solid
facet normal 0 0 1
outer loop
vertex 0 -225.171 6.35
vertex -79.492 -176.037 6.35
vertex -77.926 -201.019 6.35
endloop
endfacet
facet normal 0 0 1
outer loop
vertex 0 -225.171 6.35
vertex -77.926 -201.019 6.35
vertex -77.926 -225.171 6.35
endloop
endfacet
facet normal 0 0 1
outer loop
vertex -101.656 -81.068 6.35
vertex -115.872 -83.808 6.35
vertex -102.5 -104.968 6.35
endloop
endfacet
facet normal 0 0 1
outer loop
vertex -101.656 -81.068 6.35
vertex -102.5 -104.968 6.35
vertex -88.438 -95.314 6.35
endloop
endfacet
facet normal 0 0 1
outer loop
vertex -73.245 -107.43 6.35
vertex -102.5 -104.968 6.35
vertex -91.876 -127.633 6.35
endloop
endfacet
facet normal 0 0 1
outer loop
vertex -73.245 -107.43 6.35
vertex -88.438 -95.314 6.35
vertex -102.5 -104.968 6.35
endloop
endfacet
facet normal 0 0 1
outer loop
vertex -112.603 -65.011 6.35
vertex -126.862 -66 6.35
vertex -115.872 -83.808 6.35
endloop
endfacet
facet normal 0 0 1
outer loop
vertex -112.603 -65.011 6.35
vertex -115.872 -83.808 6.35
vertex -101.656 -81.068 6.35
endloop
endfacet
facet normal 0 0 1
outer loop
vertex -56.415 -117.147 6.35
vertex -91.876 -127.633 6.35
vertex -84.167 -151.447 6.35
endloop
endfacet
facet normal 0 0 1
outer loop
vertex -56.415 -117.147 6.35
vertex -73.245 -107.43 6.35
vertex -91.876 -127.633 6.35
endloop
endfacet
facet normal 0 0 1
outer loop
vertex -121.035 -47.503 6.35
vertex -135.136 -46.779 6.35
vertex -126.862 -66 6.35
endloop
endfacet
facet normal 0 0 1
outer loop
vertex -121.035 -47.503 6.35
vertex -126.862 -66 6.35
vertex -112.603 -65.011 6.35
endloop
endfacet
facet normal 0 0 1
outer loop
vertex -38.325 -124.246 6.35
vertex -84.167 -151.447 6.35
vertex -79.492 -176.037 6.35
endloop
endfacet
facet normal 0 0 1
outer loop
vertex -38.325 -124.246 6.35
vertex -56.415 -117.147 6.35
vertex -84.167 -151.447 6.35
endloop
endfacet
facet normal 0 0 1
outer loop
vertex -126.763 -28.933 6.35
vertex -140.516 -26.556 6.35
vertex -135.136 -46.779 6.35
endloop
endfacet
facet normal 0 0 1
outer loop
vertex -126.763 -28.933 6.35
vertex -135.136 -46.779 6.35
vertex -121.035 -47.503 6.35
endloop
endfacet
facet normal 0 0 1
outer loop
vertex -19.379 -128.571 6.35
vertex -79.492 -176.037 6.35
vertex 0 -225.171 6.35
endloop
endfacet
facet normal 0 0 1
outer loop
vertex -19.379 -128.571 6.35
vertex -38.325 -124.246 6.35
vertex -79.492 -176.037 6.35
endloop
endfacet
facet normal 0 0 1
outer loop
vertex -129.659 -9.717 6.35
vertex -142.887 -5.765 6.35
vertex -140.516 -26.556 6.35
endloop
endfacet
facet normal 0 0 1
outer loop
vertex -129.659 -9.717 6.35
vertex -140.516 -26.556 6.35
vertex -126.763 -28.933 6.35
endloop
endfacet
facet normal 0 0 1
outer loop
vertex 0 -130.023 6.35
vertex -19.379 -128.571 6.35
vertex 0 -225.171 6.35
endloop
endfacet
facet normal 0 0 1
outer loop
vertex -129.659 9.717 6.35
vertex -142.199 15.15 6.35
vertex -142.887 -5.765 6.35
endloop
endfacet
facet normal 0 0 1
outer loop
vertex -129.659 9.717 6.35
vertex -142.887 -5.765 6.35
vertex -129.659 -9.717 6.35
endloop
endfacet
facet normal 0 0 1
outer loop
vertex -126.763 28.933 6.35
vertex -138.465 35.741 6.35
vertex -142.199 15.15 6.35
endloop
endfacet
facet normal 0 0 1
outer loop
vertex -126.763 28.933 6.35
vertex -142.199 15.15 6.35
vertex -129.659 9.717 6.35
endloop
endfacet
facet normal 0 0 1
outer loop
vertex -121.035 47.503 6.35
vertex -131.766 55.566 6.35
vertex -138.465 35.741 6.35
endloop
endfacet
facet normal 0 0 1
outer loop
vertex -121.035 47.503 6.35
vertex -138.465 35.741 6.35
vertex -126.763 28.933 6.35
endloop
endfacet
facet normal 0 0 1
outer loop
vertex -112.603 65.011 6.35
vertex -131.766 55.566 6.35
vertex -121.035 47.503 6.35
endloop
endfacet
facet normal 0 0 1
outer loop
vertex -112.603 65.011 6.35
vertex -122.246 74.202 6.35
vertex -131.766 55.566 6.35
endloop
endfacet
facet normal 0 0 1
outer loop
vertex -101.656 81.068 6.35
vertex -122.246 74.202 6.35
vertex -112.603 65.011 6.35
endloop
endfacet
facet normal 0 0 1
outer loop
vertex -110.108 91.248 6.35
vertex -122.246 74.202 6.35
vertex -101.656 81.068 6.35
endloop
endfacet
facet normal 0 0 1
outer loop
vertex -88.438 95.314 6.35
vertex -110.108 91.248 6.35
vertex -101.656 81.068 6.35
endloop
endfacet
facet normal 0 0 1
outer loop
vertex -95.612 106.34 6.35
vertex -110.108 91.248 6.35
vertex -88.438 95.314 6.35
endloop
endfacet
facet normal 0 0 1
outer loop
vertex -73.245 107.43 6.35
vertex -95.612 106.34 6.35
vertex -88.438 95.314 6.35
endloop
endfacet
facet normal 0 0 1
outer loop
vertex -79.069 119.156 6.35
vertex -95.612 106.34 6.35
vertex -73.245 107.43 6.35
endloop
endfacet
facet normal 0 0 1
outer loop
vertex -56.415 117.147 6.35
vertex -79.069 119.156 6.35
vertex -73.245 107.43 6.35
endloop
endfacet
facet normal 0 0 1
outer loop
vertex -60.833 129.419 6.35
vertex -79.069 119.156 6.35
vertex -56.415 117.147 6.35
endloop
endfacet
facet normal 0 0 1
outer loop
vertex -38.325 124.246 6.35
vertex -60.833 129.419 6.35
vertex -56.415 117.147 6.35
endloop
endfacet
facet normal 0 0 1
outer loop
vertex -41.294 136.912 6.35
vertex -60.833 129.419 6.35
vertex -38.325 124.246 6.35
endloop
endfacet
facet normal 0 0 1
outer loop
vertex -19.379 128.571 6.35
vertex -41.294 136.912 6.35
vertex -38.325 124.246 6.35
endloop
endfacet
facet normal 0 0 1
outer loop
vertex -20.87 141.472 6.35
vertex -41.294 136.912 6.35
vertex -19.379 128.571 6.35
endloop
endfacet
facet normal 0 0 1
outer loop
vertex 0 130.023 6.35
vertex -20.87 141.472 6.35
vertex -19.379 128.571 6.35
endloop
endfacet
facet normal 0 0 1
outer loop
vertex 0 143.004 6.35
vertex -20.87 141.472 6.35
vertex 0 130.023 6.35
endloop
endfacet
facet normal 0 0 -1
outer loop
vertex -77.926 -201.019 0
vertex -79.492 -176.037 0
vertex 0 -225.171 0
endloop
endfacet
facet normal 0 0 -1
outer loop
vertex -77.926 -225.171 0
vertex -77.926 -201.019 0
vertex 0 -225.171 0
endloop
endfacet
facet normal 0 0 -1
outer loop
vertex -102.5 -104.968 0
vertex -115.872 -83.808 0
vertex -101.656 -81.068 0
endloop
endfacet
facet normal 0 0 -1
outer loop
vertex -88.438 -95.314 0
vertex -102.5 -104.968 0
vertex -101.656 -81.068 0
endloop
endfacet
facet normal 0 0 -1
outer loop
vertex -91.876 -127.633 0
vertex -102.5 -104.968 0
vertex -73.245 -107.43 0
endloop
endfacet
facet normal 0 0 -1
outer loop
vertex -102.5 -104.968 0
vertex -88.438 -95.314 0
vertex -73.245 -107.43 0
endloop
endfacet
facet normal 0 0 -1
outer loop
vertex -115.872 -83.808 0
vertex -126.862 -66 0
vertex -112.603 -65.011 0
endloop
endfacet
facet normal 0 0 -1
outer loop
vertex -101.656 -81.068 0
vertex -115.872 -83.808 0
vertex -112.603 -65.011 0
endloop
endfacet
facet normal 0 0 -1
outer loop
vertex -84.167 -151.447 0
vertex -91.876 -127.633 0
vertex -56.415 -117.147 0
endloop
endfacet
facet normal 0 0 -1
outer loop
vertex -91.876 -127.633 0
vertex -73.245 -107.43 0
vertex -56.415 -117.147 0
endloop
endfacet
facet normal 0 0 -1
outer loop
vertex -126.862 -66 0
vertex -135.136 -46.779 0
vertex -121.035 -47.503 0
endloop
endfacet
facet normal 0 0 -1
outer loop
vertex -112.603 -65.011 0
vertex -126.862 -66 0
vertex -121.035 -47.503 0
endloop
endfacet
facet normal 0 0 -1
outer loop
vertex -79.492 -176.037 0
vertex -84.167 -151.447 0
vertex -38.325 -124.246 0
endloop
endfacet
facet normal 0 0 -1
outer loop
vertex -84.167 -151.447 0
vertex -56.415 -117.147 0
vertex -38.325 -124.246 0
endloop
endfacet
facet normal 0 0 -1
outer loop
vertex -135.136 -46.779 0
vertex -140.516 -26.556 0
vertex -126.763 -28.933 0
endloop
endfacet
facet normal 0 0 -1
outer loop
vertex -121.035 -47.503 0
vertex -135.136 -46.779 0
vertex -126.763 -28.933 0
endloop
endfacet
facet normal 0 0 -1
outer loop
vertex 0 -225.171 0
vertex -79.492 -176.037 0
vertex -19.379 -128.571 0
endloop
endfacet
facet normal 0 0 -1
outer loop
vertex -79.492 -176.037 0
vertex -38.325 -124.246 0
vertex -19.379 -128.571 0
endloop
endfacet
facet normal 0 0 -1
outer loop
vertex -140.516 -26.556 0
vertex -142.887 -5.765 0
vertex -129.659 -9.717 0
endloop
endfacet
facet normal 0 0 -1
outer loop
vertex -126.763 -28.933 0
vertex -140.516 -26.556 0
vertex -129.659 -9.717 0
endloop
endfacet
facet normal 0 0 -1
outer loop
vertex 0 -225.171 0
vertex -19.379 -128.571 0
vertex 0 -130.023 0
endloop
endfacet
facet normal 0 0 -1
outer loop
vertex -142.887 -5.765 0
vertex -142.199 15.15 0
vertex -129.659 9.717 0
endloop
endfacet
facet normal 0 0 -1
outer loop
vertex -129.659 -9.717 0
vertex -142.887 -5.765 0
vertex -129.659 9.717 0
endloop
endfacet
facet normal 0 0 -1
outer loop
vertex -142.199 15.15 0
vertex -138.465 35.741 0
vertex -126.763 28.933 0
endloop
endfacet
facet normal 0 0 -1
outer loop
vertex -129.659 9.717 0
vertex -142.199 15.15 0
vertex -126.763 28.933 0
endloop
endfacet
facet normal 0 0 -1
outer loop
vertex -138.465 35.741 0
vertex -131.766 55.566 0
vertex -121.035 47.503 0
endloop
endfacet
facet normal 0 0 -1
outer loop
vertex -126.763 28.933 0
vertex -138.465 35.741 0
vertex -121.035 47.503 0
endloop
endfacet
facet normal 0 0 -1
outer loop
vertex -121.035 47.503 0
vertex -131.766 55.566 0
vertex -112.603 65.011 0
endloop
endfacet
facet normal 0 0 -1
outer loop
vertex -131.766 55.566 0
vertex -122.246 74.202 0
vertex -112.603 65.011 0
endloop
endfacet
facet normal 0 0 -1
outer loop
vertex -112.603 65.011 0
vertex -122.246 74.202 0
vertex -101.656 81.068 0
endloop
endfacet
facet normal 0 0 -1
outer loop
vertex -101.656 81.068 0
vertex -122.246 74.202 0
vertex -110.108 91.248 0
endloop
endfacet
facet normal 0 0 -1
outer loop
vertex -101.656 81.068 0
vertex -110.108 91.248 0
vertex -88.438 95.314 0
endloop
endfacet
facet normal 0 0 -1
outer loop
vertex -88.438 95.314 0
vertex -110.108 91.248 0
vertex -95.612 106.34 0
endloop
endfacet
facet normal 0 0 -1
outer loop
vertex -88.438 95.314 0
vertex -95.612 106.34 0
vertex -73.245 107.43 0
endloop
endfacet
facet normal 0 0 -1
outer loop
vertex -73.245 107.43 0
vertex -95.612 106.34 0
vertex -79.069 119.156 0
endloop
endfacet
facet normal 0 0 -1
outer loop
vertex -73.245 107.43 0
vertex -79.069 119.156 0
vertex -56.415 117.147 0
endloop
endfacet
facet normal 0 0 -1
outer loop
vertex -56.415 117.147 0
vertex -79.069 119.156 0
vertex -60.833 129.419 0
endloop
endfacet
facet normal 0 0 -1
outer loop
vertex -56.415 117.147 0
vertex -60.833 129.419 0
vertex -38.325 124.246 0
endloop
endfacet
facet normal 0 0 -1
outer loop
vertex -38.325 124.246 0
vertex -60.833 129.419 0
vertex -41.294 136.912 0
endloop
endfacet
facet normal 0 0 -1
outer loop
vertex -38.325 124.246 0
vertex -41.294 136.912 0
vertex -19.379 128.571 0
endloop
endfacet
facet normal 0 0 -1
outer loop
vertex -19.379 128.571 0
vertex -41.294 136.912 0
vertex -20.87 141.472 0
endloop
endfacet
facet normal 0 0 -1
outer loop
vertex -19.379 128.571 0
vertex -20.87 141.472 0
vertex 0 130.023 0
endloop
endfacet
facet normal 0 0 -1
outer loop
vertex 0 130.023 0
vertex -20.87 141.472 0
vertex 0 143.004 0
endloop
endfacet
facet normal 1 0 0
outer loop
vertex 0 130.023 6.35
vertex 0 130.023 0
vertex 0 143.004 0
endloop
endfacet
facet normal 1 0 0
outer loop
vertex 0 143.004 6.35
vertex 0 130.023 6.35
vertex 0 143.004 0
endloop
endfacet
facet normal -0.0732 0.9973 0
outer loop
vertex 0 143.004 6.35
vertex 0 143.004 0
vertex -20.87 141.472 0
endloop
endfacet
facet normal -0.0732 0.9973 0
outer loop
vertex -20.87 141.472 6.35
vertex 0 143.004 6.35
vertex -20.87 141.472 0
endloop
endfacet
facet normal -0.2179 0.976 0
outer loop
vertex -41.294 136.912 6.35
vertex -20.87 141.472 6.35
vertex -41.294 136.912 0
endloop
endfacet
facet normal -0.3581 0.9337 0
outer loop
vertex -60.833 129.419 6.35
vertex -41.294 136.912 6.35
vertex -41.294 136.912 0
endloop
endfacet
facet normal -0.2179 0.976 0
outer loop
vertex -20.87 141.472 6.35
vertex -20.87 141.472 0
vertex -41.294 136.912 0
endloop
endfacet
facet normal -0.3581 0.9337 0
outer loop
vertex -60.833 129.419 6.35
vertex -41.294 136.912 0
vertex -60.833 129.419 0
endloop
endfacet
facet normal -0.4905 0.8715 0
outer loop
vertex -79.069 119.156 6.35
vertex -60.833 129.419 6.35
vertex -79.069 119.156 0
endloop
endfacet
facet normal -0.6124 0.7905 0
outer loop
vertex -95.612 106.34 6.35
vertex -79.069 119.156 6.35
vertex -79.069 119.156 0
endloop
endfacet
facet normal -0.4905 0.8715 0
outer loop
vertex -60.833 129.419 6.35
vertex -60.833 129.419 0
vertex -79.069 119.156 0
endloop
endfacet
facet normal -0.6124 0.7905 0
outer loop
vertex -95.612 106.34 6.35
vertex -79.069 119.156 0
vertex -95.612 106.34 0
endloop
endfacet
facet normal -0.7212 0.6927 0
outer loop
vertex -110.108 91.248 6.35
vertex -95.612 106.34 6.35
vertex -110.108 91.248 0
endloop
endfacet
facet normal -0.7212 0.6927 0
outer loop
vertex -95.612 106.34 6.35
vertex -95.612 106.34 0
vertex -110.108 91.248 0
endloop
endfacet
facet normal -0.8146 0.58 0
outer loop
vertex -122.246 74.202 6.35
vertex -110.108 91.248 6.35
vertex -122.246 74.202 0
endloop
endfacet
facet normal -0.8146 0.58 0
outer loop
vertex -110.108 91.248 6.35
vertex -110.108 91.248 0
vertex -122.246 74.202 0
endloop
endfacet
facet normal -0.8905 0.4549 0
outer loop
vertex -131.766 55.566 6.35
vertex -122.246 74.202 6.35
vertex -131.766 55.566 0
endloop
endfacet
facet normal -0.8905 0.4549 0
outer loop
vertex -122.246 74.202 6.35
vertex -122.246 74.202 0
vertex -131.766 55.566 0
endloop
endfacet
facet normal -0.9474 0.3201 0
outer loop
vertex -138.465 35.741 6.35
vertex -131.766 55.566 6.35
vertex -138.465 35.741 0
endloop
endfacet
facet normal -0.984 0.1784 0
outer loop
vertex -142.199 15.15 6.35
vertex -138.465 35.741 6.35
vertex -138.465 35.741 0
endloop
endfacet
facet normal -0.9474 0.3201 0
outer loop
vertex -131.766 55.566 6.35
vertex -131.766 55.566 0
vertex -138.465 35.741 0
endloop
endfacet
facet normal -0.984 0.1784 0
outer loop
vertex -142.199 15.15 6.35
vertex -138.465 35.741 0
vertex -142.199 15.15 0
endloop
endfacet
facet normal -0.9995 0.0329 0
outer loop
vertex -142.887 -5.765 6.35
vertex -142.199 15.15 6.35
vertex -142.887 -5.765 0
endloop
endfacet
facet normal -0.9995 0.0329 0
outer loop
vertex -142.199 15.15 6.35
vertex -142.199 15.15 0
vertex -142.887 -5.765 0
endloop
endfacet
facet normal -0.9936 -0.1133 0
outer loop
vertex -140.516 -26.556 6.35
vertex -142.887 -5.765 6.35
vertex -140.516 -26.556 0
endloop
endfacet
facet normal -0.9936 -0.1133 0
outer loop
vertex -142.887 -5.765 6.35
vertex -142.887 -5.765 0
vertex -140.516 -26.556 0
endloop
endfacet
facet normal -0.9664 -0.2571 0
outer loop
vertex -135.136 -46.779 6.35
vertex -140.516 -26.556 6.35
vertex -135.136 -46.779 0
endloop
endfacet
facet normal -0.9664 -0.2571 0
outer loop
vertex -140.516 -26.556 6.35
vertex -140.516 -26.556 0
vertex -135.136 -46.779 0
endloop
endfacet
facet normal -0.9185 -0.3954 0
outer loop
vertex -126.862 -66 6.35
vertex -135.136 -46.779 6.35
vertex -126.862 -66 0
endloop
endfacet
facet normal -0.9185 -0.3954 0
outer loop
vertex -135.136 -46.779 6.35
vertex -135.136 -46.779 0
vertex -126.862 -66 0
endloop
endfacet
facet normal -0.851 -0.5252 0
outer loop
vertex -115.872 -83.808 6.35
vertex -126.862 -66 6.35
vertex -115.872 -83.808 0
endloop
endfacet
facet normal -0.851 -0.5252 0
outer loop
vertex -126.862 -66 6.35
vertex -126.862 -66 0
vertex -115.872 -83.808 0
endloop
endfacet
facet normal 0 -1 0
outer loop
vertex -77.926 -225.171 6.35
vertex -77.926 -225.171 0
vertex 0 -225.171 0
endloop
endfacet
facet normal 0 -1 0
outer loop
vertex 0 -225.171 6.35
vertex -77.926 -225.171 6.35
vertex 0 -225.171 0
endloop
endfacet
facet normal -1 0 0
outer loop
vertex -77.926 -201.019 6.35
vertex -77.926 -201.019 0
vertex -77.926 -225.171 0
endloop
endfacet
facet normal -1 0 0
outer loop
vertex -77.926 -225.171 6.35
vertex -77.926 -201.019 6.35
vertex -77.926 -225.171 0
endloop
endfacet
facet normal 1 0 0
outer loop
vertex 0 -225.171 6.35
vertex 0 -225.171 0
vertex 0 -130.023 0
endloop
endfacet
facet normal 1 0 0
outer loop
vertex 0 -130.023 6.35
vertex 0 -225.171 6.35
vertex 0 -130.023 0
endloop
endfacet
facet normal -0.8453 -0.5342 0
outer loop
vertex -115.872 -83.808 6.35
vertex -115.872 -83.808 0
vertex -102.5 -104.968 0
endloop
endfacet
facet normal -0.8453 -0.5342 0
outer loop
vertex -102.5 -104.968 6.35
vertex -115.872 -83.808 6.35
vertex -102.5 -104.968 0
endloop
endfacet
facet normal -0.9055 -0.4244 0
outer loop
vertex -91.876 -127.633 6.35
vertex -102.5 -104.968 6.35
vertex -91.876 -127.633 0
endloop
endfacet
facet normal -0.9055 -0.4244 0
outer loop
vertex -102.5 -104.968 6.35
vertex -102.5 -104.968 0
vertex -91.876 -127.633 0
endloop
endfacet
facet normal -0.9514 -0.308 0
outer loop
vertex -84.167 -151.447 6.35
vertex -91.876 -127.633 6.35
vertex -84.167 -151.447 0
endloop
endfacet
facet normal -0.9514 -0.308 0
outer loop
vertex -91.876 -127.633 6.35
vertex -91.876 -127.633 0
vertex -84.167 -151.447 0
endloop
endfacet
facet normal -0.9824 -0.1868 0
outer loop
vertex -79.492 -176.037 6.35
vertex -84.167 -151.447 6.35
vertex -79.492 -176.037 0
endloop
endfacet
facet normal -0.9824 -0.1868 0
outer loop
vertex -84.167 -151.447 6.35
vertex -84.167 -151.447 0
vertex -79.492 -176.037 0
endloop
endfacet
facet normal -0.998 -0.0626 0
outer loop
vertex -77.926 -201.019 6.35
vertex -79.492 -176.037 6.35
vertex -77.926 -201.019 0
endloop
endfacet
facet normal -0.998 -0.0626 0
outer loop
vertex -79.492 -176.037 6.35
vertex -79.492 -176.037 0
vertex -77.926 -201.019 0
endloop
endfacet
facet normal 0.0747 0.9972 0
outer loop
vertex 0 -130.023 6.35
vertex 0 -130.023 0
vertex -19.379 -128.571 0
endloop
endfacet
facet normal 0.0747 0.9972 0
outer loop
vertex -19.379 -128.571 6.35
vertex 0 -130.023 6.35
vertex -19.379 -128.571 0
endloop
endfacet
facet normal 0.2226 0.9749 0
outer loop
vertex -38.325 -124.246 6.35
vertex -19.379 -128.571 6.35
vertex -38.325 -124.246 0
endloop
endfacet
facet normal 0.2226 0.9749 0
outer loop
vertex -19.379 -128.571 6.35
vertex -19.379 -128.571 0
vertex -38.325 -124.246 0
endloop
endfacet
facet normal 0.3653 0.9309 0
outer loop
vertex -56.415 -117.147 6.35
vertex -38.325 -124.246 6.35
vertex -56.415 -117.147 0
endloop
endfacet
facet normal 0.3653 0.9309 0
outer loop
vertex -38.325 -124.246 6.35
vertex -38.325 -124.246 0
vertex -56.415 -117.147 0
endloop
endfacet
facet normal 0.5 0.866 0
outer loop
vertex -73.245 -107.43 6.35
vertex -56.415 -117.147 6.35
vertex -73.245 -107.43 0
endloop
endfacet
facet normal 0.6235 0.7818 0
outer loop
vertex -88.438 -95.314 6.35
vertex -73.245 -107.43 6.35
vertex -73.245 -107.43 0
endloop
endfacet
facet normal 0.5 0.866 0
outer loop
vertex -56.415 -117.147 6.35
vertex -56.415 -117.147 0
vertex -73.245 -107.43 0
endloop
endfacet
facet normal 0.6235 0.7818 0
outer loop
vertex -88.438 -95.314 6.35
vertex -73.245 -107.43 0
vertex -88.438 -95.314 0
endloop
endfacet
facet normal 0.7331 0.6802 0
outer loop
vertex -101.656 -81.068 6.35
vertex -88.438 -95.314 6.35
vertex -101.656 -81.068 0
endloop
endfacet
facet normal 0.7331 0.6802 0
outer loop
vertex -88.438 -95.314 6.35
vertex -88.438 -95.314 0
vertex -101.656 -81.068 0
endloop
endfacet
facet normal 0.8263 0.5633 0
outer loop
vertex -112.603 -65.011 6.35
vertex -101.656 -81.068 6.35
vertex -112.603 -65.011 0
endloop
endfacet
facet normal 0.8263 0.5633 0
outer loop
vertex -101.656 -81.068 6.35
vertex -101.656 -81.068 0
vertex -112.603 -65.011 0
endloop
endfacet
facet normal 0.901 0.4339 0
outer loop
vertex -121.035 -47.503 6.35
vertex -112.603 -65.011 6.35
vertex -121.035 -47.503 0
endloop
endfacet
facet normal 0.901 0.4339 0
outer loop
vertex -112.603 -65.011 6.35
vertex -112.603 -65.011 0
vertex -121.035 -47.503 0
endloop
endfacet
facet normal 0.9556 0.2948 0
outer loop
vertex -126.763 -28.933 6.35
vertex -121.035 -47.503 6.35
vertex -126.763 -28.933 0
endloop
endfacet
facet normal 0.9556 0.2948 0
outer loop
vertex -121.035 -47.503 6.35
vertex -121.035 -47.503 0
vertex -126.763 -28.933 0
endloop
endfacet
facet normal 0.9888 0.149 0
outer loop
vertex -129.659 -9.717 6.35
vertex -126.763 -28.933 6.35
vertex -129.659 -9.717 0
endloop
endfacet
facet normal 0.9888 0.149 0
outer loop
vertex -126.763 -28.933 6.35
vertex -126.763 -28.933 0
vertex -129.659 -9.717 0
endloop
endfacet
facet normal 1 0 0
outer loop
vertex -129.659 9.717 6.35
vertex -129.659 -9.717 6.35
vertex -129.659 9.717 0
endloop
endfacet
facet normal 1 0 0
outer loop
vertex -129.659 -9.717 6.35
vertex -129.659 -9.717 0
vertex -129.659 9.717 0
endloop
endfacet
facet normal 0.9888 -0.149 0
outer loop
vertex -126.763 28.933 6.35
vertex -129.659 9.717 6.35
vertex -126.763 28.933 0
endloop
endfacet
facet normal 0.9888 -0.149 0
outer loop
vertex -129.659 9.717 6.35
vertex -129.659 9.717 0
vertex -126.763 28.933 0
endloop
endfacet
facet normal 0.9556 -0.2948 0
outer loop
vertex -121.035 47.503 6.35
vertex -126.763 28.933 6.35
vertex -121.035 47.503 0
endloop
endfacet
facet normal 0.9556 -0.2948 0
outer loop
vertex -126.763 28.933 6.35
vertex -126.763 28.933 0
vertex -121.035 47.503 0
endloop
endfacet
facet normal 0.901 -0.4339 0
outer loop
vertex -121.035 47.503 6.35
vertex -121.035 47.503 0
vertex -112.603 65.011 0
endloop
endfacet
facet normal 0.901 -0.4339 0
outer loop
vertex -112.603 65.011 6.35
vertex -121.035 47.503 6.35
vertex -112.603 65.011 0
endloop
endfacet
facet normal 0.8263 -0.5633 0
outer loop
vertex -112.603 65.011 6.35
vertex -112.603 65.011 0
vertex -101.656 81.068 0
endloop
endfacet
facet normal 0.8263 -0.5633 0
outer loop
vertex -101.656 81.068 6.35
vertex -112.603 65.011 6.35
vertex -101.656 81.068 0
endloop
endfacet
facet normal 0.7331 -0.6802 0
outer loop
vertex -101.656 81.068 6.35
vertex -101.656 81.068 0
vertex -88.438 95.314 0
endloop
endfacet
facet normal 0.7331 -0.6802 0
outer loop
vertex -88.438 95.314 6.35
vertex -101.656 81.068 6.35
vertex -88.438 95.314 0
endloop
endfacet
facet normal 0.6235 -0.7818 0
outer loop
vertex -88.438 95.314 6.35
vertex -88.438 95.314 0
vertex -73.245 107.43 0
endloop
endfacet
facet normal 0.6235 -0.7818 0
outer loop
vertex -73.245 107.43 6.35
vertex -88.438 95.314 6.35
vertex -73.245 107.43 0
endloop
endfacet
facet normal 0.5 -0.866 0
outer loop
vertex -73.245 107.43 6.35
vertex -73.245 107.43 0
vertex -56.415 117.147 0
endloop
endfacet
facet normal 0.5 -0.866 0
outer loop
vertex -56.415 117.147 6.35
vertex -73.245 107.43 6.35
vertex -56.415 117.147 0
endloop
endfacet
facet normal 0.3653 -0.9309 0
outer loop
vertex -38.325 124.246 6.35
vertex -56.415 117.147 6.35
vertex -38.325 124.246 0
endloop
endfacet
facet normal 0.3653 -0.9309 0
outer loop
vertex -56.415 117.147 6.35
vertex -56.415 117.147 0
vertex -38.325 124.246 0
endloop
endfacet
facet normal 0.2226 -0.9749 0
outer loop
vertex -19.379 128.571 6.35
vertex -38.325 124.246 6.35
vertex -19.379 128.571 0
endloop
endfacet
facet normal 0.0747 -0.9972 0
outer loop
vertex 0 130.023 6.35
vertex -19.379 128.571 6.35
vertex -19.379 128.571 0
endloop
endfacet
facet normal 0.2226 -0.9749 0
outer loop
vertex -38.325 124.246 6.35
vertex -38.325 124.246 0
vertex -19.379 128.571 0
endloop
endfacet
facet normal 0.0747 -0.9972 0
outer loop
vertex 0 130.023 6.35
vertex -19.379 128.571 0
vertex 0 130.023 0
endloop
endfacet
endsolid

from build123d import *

# Parameters (mm, degrees)
BOSS_EXTRUDE3_DEPTH = 6.35


with BuildPart() as part:
    # Sketch1 → Boss-Extrude3 (new body)
    with BuildSketch(Plane.XY):
        with BuildLine():
            Line((0, 130.023), (0, 143.0035))
            ThreePointArc((0, 143.0035), (-127.347637401, 65.058283566), (-115.871551473, -83.808022119))
            ThreePointArc((-115.871551473, -83.808022119), (-87.648494018, -139.418965385), (-77.925699061, -201.019170265))
            Line((-77.925699061, -201.019170265), (-77.925699061, -225.171))
            Line((-77.925699061, -225.171), (0, -225.171))
            Line((0, -225.171), (0, -130.023))
            ThreePointArc((0, -130.023), (-130.023, 0), (0, 130.023))
        make_face()
    extrude(amount=BOSS_EXTRUDE3_DEPTH)


solid = part.part
